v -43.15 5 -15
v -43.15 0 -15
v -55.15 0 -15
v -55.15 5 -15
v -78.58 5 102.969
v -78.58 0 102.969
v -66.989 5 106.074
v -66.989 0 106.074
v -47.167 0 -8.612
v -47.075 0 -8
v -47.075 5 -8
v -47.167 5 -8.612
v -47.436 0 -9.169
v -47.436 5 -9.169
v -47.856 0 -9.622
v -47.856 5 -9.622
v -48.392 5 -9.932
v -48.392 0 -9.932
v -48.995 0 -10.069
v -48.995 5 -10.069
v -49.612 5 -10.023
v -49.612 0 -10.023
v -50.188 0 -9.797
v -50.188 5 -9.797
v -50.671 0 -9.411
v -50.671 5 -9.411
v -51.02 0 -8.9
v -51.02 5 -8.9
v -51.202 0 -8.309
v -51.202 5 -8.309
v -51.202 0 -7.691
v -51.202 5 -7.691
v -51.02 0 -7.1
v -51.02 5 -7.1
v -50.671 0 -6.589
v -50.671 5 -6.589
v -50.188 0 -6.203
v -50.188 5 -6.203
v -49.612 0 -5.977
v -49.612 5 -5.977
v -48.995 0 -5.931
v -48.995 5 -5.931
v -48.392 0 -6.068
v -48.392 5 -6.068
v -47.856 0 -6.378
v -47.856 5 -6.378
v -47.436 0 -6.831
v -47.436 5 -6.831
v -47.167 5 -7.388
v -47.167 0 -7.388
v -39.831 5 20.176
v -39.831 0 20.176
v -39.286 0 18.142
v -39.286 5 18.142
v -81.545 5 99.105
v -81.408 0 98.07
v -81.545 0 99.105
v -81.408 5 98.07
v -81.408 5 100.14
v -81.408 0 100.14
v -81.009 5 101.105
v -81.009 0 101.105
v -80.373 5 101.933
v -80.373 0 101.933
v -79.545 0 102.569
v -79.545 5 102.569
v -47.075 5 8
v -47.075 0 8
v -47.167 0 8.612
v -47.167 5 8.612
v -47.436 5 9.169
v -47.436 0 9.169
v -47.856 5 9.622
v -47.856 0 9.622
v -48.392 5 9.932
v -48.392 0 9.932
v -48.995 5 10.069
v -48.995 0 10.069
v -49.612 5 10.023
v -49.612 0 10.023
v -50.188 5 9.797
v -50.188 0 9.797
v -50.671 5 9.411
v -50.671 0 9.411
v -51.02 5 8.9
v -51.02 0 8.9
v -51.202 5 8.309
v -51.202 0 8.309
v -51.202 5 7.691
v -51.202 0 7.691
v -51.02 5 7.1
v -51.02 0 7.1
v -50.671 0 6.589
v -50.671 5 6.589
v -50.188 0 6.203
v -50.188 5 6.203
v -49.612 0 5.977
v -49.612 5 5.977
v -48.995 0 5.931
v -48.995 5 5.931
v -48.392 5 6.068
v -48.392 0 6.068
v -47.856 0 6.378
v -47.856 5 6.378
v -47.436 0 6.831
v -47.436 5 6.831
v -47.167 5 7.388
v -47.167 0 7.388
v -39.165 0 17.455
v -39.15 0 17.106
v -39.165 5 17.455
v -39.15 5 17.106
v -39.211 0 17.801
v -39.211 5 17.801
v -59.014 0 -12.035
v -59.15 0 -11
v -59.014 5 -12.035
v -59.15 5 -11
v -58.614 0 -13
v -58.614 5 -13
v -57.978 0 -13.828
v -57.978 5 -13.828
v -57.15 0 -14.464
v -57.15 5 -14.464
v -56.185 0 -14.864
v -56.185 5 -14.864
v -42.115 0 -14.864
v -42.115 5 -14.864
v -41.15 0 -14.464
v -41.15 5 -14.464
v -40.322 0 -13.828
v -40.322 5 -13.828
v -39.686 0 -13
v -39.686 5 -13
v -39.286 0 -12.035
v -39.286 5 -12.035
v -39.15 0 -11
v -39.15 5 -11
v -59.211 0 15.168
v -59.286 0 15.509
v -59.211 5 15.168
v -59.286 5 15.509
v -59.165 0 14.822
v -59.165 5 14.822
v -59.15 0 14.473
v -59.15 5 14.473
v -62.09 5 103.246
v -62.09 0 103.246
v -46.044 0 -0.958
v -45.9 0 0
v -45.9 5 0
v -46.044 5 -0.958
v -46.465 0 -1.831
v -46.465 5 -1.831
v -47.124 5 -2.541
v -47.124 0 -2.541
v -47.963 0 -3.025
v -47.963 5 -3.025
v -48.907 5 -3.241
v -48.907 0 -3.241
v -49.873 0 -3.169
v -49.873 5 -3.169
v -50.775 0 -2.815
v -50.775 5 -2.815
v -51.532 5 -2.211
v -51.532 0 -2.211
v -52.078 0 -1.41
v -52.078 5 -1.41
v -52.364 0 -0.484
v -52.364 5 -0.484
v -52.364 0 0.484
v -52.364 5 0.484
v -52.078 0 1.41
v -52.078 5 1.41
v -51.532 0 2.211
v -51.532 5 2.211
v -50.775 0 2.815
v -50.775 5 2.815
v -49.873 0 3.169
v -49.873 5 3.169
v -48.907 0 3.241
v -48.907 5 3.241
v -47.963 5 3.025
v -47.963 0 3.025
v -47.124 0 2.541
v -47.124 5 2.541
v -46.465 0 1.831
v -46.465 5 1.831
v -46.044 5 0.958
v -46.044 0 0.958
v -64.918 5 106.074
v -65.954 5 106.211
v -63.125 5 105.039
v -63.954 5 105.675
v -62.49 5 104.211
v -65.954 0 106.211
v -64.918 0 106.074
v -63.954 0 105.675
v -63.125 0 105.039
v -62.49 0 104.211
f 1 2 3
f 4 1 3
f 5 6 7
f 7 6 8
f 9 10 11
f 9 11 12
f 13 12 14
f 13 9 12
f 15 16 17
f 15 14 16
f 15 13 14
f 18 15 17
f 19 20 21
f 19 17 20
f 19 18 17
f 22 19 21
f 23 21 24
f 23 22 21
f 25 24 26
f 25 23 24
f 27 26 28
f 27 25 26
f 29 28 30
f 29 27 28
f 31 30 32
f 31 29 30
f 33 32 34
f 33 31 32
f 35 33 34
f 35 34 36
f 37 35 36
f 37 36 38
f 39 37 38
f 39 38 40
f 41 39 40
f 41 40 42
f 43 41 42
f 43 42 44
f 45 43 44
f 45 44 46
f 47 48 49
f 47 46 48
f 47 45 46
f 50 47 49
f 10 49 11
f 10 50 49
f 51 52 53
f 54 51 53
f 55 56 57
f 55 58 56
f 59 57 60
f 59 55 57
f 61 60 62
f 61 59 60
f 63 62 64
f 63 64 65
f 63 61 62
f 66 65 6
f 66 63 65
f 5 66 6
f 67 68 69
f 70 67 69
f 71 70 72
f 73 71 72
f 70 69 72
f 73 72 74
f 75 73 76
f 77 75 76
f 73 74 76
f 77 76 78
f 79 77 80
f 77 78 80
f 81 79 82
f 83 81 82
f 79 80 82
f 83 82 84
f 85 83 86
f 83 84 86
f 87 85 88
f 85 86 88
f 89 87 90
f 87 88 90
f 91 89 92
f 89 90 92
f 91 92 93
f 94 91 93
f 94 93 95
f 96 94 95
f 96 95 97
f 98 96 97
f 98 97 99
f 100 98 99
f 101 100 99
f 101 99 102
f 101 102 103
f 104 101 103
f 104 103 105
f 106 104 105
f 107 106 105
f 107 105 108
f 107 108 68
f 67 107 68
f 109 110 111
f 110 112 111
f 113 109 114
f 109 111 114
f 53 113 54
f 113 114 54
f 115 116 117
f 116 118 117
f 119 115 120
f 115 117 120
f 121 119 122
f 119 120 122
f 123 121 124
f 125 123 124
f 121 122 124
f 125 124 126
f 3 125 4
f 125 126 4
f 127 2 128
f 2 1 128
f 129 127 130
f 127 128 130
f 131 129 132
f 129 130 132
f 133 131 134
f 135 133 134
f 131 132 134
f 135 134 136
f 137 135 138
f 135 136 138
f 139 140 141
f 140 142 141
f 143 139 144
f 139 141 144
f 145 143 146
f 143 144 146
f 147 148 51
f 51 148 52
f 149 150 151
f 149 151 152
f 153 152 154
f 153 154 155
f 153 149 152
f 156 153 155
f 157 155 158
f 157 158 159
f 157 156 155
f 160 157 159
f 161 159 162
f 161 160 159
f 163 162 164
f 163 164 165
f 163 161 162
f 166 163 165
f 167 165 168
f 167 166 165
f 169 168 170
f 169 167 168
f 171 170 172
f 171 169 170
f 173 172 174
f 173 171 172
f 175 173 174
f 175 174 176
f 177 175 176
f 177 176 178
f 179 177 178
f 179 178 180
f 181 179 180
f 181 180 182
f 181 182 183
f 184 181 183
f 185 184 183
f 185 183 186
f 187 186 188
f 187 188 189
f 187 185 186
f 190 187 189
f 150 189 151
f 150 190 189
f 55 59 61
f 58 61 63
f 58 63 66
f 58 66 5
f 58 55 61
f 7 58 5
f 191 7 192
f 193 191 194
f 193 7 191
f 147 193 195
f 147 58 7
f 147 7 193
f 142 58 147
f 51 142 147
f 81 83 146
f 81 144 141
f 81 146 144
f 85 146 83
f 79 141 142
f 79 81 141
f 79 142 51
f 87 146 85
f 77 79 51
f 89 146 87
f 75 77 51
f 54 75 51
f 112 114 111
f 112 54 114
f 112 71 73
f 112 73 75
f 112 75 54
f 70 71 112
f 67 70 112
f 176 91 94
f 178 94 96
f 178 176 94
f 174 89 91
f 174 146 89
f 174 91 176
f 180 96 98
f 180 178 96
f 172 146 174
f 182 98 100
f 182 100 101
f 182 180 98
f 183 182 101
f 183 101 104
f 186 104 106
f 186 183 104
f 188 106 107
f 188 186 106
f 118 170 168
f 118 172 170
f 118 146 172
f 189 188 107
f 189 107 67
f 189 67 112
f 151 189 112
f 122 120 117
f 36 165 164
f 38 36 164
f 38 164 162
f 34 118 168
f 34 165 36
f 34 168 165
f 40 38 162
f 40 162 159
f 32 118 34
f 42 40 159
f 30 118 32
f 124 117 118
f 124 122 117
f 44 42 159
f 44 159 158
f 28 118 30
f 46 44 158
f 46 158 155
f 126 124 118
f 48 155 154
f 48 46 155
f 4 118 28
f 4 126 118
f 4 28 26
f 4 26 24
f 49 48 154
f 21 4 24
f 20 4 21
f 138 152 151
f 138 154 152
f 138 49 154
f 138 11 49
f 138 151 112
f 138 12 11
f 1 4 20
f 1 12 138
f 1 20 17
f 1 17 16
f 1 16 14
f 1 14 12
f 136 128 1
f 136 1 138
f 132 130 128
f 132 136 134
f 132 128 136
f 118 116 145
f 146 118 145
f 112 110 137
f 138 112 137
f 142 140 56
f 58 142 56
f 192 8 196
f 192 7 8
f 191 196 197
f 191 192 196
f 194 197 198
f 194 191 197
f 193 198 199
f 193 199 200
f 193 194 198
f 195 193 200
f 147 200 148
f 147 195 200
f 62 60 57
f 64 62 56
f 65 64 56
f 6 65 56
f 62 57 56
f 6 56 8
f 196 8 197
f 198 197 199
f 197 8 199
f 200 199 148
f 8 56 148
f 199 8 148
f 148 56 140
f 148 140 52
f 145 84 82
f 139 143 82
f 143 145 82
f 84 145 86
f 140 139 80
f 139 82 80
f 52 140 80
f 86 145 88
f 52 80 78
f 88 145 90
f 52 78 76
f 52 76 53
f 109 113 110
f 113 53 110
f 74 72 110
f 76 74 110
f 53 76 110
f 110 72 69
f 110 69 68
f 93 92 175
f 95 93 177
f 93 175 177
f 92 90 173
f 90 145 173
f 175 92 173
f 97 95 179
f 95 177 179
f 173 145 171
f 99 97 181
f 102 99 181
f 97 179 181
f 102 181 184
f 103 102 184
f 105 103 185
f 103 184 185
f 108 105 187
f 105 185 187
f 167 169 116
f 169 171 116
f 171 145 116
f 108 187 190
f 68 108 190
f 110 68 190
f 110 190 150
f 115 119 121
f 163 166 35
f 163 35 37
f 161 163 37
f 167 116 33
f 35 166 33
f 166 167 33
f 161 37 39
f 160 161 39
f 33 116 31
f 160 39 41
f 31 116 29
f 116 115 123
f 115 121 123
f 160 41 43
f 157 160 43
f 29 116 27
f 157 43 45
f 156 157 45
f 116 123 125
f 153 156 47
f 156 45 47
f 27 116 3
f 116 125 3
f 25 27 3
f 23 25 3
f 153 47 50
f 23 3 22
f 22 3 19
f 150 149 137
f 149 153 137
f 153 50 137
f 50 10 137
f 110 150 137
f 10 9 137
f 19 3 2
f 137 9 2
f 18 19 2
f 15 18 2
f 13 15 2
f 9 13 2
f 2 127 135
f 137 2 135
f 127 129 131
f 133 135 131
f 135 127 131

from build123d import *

# Parameters (mm, degrees)
SKETCH1_R           = 3.25
BOSS_EXTRUDE1_DEPTH = 5
CUT_EXTRUDE1_START  = -6
SKETCH2_R           = 2.075
CUT_EXTRUDE1_DEPTH  = 7
FILLET1_R           = 4


with BuildPart() as part:
    # Sketch1 → Boss-Extrude1 (new body)
    with BuildSketch(Plane(origin=(0, 0, 0), x_dir=(1, 0, 0), z_dir=(0, 1, 0))):
        Polygon((-59.15, -15), (-82.443714059, -101.933324366), (-63.125197533, -107.109705268), (-39.831483474, -20.176380902), (-39.15, -17.633049952), (-39.15, -15), (-39.15, 15), (-59.15, 15), align=None)
        with Locations((-49.15, 0)):
            Circle(SKETCH1_R, mode=Mode.SUBTRACT)
    extrude(amount=BOSS_EXTRUDE1_DEPTH)

    # Sketch2 → Cut-Extrude1 (cut)
    with BuildSketch(Plane(origin=(0, 5, 0), x_dir=(1, 0, 0), z_dir=(0, 1, 0)).offset(CUT_EXTRUDE1_START)):
        with Locations((-49.15, 8)):
            Circle(SKETCH2_R)
    cut_extrude1 = extrude(amount=CUT_EXTRUDE1_DEPTH, mode=Mode.SUBTRACT)

    # Mirror1: Cut-Extrude1 across plane
    add(cut_extrude1.mirror(Plane.XY), mode=Mode.SUBTRACT)

    # Fillet1
    fillet1_edges = [part.edges().sort_by_distance(p)[0] for p in [
        (-39.15, 2.5, 17.633049952),
        (-63.125197533, 2.5, 107.109705268),
        (-82.443714059, 2.5, 101.933324366),
        (-59.15, 2.5, 15),
        (-59.15, 2.5, -15),
        (-39.15, 2.5, -15),
    ]]
    fillet(fillet1_edges, radius=FILLET1_R)


solid = part.part
